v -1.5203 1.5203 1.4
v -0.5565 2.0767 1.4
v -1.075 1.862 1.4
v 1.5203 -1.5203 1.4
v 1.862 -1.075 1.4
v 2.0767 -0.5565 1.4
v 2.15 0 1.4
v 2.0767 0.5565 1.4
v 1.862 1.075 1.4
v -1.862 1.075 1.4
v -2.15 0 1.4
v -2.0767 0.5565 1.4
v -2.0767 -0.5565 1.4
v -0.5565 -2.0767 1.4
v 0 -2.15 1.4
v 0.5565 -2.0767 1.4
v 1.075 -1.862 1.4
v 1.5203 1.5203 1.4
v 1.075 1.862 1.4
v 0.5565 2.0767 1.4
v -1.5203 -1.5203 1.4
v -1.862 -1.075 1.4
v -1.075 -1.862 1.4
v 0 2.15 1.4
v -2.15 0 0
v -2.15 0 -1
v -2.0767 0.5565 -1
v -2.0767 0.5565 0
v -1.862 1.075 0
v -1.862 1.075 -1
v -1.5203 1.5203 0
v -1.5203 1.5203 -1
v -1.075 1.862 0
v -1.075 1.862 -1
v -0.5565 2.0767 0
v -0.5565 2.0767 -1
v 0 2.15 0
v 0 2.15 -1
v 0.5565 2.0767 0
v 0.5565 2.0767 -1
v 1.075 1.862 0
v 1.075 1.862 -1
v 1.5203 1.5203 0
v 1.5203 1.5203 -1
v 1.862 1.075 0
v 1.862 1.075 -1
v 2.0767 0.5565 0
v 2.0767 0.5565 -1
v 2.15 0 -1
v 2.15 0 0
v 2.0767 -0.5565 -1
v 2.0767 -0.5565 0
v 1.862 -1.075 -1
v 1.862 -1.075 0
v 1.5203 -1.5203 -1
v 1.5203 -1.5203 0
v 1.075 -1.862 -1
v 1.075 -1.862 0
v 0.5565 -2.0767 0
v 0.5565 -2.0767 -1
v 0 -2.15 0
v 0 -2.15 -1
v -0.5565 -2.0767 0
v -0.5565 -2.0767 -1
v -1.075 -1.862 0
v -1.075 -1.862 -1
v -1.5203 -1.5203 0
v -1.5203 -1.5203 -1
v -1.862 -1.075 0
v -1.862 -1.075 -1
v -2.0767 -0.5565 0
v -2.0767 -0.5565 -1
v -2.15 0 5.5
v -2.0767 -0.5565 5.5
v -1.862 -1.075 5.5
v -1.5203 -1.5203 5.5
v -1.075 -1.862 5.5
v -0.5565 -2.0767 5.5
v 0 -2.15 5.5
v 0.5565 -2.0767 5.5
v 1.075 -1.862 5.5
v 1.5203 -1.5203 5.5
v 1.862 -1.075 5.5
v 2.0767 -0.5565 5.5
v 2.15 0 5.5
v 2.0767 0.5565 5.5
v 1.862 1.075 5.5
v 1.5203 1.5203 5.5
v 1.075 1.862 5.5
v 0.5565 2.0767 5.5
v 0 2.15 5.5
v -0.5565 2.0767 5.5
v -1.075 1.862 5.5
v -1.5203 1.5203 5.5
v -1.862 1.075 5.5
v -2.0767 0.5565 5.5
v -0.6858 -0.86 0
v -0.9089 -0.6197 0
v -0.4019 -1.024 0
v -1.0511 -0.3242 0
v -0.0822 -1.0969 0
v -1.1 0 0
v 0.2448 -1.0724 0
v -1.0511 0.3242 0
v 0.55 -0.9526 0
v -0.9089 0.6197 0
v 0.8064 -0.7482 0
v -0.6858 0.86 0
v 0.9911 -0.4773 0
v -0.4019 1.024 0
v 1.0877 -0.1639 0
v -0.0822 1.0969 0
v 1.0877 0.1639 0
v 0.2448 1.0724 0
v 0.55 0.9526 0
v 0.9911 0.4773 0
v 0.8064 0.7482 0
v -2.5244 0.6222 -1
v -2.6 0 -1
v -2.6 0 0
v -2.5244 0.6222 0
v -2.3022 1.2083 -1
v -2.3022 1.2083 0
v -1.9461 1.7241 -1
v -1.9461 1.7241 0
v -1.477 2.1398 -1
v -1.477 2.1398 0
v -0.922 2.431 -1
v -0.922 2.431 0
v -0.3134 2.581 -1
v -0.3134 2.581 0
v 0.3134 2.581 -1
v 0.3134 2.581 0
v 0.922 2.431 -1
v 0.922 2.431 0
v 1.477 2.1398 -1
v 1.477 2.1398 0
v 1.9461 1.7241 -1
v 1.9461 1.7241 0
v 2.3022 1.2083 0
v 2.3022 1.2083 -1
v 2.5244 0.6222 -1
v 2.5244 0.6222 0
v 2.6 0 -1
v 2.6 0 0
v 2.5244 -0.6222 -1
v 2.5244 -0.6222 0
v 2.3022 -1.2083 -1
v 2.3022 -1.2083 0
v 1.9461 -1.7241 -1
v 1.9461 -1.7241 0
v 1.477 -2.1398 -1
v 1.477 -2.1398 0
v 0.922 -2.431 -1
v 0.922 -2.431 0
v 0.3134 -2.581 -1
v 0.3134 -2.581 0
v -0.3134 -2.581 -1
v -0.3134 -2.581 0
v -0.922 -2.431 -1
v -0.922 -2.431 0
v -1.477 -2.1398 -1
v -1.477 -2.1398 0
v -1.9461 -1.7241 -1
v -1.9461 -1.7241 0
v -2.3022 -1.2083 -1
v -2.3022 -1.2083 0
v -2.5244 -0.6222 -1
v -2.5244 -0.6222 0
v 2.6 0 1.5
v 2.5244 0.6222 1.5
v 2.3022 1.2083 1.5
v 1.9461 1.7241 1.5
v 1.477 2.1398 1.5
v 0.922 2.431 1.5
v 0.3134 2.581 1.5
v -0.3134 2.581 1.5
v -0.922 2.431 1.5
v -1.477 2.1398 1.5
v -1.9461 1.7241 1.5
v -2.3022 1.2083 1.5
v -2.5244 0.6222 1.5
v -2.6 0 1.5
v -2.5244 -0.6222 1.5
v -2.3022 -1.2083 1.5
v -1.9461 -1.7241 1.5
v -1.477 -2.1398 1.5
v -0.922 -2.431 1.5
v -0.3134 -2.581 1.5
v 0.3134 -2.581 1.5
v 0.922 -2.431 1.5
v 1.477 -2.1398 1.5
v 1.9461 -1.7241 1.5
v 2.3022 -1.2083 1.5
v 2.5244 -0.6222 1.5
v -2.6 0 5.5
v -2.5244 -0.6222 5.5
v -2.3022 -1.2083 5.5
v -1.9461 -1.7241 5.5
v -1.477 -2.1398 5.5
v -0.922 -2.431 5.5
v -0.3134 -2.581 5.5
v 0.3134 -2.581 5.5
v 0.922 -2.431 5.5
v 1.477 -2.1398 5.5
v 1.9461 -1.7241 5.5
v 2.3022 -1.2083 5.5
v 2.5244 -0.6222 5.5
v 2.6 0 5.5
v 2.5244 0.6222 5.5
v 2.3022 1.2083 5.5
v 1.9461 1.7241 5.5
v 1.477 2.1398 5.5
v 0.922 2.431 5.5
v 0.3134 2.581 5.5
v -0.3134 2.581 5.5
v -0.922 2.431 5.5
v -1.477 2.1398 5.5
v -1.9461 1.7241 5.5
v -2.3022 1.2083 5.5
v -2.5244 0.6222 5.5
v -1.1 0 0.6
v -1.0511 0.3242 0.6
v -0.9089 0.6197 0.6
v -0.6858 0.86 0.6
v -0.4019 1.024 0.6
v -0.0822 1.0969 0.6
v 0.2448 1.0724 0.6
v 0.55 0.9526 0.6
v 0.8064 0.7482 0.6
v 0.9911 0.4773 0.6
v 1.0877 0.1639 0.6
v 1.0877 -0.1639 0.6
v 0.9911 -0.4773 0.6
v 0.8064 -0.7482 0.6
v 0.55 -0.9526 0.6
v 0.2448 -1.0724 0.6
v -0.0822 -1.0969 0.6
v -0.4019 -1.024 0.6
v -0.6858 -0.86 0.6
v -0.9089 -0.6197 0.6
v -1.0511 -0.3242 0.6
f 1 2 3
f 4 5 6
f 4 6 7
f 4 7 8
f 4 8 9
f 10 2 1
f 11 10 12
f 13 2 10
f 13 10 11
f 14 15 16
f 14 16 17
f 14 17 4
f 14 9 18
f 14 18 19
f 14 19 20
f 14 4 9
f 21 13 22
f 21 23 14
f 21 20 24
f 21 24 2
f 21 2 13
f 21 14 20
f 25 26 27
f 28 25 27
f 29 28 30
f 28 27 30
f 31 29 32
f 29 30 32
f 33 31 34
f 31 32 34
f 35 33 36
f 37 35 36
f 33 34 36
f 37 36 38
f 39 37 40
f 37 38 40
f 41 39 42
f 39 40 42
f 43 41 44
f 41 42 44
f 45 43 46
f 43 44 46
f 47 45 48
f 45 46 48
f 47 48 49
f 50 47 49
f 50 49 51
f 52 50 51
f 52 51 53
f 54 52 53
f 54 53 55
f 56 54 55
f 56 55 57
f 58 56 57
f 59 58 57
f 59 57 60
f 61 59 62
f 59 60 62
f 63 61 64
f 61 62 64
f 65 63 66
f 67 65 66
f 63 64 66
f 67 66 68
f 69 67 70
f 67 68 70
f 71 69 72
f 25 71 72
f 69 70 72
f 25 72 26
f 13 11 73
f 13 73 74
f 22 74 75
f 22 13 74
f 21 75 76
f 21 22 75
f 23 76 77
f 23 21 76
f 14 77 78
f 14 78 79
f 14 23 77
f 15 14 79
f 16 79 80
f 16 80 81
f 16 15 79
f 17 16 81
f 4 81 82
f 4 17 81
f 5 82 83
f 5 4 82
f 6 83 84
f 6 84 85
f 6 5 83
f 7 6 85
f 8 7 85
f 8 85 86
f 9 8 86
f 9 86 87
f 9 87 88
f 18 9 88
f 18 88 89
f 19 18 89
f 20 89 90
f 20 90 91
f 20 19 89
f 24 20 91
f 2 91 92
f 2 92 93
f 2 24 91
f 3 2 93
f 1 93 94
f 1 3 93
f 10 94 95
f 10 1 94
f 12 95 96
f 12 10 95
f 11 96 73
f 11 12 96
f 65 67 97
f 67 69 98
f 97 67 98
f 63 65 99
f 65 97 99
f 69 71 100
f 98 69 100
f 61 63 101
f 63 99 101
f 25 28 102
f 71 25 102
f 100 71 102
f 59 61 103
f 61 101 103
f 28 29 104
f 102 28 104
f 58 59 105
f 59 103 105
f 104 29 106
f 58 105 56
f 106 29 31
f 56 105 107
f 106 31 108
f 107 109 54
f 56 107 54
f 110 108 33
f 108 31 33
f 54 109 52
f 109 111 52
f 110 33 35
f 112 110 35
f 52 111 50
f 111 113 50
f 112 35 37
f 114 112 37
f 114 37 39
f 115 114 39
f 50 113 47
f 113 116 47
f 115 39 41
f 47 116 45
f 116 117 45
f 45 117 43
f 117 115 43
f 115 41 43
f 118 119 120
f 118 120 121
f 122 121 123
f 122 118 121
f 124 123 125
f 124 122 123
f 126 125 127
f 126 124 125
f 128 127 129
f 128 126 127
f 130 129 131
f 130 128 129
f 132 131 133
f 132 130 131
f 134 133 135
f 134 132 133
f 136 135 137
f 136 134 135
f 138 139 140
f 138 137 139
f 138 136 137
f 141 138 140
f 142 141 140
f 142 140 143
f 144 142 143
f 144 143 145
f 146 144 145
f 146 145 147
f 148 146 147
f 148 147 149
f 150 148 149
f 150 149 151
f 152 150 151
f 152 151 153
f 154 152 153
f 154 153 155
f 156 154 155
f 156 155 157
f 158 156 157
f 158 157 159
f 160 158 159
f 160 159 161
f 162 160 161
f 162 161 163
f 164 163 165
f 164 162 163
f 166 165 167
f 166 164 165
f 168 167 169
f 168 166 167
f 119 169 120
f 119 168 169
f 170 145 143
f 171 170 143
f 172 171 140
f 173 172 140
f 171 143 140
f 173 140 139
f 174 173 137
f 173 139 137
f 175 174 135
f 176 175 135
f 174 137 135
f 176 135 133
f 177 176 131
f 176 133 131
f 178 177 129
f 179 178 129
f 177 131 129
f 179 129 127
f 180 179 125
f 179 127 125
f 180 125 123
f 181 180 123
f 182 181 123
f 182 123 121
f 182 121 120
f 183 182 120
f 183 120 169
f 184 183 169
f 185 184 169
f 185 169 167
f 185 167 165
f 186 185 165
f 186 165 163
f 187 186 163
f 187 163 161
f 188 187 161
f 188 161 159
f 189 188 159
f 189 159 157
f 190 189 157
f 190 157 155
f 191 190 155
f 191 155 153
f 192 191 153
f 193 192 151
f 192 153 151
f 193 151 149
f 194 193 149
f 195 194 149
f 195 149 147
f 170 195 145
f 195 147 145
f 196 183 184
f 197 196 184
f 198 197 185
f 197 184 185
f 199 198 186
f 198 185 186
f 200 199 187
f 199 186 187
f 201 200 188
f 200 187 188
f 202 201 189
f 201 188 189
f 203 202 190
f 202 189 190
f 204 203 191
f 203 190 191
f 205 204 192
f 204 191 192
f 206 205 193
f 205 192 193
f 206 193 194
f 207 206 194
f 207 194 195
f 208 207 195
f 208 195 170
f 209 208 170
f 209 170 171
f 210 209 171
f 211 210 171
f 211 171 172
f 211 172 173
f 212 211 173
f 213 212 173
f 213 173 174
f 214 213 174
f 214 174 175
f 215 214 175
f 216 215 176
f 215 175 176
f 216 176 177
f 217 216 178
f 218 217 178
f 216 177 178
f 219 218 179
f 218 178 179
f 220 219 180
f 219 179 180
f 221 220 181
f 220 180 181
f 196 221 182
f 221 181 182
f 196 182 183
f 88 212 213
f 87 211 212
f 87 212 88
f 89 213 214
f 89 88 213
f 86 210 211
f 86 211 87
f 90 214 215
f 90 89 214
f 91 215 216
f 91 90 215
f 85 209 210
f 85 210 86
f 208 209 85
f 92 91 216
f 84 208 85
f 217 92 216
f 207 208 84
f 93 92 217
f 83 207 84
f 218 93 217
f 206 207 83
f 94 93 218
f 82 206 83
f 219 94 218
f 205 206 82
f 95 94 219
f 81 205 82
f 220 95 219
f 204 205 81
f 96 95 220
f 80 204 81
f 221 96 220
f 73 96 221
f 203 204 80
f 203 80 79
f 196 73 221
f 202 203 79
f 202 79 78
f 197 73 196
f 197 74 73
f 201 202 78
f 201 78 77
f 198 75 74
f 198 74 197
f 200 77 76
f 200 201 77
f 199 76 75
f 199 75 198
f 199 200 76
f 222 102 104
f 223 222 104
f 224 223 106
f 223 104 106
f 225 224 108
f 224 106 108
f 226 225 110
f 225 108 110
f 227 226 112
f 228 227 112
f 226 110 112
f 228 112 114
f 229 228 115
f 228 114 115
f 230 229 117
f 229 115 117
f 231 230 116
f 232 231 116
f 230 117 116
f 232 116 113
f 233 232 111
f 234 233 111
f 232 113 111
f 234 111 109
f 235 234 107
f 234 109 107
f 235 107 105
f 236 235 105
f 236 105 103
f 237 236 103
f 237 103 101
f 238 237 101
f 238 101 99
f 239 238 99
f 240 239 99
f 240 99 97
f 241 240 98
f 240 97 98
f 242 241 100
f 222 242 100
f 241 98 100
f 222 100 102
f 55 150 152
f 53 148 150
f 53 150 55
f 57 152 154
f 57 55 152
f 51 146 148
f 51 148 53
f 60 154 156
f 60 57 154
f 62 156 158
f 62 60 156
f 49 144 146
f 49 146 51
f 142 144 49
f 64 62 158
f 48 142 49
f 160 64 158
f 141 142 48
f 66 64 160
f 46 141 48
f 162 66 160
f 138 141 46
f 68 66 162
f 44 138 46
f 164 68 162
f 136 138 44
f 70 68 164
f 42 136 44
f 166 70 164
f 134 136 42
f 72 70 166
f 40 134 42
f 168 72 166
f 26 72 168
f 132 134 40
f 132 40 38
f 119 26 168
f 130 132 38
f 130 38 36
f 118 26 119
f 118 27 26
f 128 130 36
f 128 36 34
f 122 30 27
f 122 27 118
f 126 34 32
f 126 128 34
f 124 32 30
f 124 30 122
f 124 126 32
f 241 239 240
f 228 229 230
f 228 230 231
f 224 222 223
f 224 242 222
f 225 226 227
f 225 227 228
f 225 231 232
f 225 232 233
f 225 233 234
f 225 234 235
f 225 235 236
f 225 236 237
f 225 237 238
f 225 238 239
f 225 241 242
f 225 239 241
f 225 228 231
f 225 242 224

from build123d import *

# Parameters (mm, degrees)
SKETCH_1_R          = 2.6
EXTRUDE_1_DEPTH     = 1.5
SKETCH_2_R          = 1.1
CUT_EXTRUDE_1_DEPTH = 0.6
EXTRUDE_START       = 1
SKETCH_3_R          = 2.6
SKETCH_3_R_2        = 2.15
EXTRUDE_2_DEPTH     = 1
SKETCH_4_R          = 2.6
EXTRUDE_3_DEPTH     = 4
CUT_EXTRUDE_START   = -4.1
SKETCH_5_R          = 2.15
CUT_EXTRUDE_2_DEPTH = 4.1


with BuildPart() as part:
    # 草图1 → 凸台-拉伸1 (new body)
    with BuildSketch(Plane.XY):
        Circle(SKETCH_1_R)
    extrude(amount=EXTRUDE_1_DEPTH)

    # 草图2 → 切除-拉伸1 (cut)
    with BuildSketch(Plane(origin=(0, 0, 0), x_dir=(-1, 0, 0), z_dir=(0, 0, -1))):
        Circle(SKETCH_2_R)
    extrude(amount=-CUT_EXTRUDE_1_DEPTH, mode=Mode.SUBTRACT)

    # 草图3 → 凸台-拉伸2 (add)
    with BuildSketch(Plane(origin=(0, 0, 0), x_dir=(-1, 0, 0), z_dir=(0, 0, -1)).offset(EXTRUDE_START)):
        Circle(SKETCH_3_R)
        Circle(SKETCH_3_R_2, mode=Mode.SUBTRACT)
    extrude(amount=-EXTRUDE_2_DEPTH)

    # 草图4 → 凸台-拉伸3 (add)
    with BuildSketch(Plane.XY.offset(1.5)):
        with Locations(Location((0, 0, 0), (0, 0, 180))):
            Circle(SKETCH_4_R)
    extrude(amount=EXTRUDE_3_DEPTH)

    # 草图5 → 切除-拉伸2 (cut)
    with BuildSketch(Plane.XY.offset(5.5).offset(CUT_EXTRUDE_START)):
        with Locations(Location((0, 0, 0), (0, 0, 180))):
            Circle(SKETCH_5_R)
    extrude(amount=CUT_EXTRUDE_2_DEPTH, mode=Mode.SUBTRACT)


solid = part.part
